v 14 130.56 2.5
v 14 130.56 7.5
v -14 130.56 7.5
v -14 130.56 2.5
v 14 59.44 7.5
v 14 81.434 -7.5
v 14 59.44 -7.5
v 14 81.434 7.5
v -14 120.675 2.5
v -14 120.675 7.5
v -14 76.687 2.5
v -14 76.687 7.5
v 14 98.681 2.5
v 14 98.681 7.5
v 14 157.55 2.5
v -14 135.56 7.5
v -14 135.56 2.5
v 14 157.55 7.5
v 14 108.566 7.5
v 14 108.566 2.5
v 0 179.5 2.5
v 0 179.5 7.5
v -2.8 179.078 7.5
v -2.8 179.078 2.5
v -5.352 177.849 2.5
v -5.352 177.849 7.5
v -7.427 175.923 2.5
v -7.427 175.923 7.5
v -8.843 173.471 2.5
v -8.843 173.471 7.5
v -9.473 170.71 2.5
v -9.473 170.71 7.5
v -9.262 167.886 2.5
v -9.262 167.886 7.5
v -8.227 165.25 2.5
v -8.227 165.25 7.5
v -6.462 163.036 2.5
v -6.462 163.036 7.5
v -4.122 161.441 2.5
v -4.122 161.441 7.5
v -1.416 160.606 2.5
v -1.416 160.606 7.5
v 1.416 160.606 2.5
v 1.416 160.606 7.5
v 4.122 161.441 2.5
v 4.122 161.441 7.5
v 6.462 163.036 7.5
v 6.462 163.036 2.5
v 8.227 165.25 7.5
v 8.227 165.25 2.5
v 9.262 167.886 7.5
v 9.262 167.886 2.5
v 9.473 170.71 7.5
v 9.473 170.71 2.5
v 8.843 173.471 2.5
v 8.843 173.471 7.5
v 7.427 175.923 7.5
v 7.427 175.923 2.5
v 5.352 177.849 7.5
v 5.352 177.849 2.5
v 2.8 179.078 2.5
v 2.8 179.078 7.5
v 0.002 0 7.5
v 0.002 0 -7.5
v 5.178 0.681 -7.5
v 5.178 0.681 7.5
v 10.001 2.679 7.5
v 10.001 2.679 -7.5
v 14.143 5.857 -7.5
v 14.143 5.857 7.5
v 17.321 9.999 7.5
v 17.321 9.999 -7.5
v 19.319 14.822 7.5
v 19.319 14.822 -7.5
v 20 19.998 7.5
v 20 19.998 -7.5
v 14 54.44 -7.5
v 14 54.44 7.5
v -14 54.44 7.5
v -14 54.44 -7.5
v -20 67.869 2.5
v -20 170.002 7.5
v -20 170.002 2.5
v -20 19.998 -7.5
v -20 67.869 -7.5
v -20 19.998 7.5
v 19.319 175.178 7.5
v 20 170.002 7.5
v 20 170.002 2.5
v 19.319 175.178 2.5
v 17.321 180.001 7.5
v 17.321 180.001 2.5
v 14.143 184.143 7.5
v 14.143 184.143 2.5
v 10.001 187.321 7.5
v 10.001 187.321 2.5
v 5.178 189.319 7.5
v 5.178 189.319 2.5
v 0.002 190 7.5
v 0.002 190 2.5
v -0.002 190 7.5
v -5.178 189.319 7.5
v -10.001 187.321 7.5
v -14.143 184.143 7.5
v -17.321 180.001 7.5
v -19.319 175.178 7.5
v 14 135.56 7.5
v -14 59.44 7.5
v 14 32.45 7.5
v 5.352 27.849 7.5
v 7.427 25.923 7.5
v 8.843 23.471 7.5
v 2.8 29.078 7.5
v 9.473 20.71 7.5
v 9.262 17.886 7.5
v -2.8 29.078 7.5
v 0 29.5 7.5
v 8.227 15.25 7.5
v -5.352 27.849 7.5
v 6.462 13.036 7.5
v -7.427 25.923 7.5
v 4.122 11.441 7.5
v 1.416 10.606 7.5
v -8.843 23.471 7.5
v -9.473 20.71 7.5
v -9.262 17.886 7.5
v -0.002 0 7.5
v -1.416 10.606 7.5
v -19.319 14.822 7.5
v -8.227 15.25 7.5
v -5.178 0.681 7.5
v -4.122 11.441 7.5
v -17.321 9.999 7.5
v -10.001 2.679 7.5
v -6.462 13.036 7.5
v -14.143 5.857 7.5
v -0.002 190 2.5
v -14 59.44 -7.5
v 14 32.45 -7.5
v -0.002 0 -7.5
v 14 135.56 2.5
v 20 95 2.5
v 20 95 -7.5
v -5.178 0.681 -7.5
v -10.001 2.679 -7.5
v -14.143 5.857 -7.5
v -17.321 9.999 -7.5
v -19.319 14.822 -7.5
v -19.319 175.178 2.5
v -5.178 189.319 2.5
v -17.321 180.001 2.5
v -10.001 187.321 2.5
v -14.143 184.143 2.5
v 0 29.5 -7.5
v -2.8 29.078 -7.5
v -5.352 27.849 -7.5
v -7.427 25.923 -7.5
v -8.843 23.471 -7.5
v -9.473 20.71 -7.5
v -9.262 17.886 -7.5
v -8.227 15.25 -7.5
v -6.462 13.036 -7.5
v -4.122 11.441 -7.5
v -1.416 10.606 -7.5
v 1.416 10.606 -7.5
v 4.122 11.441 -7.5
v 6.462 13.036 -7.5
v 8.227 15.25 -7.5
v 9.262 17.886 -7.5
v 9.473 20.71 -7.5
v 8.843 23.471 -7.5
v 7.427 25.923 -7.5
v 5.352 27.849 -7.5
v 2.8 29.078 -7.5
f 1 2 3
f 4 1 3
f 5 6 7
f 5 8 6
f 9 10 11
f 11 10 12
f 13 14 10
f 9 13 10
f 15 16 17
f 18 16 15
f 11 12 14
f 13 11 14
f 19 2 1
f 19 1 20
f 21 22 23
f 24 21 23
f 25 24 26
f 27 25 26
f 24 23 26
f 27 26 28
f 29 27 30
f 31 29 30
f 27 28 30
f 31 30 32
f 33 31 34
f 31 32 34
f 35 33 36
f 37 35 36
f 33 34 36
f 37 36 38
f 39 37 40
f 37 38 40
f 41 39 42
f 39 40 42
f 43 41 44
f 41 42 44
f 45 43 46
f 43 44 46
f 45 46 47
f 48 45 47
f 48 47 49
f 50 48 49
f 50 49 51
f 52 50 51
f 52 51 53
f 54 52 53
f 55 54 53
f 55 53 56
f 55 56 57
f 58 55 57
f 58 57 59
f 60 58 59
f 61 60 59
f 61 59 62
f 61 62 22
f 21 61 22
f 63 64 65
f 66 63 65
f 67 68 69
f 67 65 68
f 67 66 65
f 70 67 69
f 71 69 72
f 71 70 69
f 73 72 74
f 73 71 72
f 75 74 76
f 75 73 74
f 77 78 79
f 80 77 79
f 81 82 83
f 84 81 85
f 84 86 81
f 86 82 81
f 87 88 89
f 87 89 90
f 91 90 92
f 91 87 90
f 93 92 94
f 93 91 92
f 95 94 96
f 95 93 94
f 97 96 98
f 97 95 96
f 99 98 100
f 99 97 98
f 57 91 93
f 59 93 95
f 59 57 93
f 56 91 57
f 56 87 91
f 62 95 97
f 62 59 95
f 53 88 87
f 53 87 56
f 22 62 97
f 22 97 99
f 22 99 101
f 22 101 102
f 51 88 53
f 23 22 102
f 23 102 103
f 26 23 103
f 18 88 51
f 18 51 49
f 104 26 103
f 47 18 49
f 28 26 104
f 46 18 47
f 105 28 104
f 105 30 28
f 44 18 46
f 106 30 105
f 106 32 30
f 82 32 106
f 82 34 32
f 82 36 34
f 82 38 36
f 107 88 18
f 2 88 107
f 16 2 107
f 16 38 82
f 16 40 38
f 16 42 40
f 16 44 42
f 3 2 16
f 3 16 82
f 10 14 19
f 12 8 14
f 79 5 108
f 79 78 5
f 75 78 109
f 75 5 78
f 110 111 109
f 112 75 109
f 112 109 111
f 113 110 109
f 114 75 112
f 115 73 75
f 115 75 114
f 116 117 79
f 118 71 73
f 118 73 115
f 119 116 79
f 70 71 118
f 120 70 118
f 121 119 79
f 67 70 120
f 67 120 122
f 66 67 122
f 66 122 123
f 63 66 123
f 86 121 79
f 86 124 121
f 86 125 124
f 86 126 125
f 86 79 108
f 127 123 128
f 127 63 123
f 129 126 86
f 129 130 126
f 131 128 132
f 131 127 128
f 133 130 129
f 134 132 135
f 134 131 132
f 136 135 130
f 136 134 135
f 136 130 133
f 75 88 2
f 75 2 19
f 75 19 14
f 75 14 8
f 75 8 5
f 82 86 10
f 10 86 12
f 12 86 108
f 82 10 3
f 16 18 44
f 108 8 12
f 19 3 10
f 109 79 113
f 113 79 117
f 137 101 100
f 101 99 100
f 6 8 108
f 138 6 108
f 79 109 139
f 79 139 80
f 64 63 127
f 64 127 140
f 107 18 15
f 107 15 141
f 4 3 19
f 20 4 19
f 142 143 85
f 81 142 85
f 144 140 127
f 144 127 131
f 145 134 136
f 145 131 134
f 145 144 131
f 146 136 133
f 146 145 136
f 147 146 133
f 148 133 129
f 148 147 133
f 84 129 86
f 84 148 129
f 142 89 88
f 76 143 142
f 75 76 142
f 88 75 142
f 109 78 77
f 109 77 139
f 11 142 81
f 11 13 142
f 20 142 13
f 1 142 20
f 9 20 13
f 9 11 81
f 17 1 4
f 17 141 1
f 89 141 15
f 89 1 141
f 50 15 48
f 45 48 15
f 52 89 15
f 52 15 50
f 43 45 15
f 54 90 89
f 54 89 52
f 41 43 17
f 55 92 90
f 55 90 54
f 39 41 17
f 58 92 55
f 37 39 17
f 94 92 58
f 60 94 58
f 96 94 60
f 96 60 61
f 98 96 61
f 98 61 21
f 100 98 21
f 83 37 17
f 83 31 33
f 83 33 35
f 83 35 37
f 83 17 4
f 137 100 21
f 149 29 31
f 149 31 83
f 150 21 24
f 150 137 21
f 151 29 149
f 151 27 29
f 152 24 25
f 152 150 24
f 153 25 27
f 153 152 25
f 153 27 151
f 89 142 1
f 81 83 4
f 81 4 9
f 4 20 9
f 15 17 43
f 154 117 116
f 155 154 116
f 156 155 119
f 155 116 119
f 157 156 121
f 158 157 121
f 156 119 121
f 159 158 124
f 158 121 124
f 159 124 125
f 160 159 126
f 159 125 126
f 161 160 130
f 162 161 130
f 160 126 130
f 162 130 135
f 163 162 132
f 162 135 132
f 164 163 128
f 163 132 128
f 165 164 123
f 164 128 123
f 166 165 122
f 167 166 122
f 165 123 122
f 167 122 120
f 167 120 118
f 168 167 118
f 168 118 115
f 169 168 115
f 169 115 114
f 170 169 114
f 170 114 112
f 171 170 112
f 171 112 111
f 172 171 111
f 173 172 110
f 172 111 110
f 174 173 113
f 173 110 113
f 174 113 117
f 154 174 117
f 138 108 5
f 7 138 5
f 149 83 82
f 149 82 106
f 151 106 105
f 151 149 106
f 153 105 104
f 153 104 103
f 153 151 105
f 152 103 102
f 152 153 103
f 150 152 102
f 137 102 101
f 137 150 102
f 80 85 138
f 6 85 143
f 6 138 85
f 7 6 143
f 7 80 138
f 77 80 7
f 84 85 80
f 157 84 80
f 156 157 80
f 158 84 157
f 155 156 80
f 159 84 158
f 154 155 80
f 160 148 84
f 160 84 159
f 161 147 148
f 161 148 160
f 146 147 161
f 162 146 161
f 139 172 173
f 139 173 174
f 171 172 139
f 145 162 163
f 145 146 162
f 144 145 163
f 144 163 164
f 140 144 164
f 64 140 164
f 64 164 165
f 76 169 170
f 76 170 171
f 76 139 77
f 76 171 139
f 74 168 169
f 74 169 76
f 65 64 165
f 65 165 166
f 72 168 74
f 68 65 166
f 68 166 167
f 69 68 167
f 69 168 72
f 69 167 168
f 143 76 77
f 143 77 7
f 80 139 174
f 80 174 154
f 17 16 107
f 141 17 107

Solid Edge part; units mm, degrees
sketch "Sketch1" plane through (0, 0, 0) normal (0, -1, 0) x (1, 0, 0)
  line L0 (20, 7.5) -> (-20, 7.5)
  line L1 (-20, 7.5) -> (-20, -7.5)
  line L2 (-20, -7.5) -> (20, -7.5)
  line L3 (20, -7.5) -> (20, 7.5)
extrude "Protrusion1" add sketch "Sketch1" against normal blind 190
sketch "Sketch2" plane through (0, 75, -7.5) normal (0, 0, -1) x (0, 1, 0)
  line L0 (20, 20) -> (-7.1309, -20)
  line L1 (-7.1309, -20) -> (115, -20)
  line L2 (115, -20) -> (115, 20)
  line L3 (115, 20) -> (20, 20)
extrude "VaciadoExtruido_1" cut sketch "Sketch2" against normal blind 10
fillet "Redondeo_1" radius 20 4 edges at (20, 190, 5) (-20, 190, 5) (20, 0, 0) (-20, 0, 0)
sketch "Sketch3" plane through (0, 75, 7.5) normal (0, 0, 1) x (0, 1, 0)
  circle A0 centre (-55, 0) radius 9.5
extrude "VaciadoExtruido_2" cut sketch "Sketch3" against normal blind 37.5377
sketch "Sketch4" plane through (0, 75, 7.5) normal (0, 0, 1) x (0, 1, 0)
  circle A0 centre (95, 0) radius 9.5
extrude "VaciadoExtruido_3" cut sketch "Sketch4" against normal blind 32.4692
sketch "Sketch5" plane through (0, 95, 7.5) normal (0, 0, 1) x (0, -1, 0)
  line L0 (13.5655, 14) -> (35.5598, 14)
  line L1 (35.5598, -14) -> (35.5598, 14)
  line L2 (13.5655, 14) -> (35.5598, -14)
  line L3 (40.5598, 14) -> (40.5598, -14)
  line L4 (62.5498, 14) -> (40.5598, -14)
  line L5 (40.5598, 14) -> (62.5498, 14)
extrude "Cutout1" cut sketch "Sketch5" against normal blind 38.4793
mirror "Mirror1" about plane through (0, 95, 7.5) normal (0, -1, 0) of "Cutout1"
sketch "Sketch6" plane through (0, 95, 7.5) normal (0, 0, 1) x (0, 1, 0)
  line L0 (3.6809, -14) -> (25.6752, 14)
  line L1 (25.6752, 14) -> (-18.3134, 14)
  line L2 (-18.3134, 14) -> (3.6809, -14)
extrude "VaciadoExtruido_9" cut sketch "Sketch6" against normal blind 77.1311
